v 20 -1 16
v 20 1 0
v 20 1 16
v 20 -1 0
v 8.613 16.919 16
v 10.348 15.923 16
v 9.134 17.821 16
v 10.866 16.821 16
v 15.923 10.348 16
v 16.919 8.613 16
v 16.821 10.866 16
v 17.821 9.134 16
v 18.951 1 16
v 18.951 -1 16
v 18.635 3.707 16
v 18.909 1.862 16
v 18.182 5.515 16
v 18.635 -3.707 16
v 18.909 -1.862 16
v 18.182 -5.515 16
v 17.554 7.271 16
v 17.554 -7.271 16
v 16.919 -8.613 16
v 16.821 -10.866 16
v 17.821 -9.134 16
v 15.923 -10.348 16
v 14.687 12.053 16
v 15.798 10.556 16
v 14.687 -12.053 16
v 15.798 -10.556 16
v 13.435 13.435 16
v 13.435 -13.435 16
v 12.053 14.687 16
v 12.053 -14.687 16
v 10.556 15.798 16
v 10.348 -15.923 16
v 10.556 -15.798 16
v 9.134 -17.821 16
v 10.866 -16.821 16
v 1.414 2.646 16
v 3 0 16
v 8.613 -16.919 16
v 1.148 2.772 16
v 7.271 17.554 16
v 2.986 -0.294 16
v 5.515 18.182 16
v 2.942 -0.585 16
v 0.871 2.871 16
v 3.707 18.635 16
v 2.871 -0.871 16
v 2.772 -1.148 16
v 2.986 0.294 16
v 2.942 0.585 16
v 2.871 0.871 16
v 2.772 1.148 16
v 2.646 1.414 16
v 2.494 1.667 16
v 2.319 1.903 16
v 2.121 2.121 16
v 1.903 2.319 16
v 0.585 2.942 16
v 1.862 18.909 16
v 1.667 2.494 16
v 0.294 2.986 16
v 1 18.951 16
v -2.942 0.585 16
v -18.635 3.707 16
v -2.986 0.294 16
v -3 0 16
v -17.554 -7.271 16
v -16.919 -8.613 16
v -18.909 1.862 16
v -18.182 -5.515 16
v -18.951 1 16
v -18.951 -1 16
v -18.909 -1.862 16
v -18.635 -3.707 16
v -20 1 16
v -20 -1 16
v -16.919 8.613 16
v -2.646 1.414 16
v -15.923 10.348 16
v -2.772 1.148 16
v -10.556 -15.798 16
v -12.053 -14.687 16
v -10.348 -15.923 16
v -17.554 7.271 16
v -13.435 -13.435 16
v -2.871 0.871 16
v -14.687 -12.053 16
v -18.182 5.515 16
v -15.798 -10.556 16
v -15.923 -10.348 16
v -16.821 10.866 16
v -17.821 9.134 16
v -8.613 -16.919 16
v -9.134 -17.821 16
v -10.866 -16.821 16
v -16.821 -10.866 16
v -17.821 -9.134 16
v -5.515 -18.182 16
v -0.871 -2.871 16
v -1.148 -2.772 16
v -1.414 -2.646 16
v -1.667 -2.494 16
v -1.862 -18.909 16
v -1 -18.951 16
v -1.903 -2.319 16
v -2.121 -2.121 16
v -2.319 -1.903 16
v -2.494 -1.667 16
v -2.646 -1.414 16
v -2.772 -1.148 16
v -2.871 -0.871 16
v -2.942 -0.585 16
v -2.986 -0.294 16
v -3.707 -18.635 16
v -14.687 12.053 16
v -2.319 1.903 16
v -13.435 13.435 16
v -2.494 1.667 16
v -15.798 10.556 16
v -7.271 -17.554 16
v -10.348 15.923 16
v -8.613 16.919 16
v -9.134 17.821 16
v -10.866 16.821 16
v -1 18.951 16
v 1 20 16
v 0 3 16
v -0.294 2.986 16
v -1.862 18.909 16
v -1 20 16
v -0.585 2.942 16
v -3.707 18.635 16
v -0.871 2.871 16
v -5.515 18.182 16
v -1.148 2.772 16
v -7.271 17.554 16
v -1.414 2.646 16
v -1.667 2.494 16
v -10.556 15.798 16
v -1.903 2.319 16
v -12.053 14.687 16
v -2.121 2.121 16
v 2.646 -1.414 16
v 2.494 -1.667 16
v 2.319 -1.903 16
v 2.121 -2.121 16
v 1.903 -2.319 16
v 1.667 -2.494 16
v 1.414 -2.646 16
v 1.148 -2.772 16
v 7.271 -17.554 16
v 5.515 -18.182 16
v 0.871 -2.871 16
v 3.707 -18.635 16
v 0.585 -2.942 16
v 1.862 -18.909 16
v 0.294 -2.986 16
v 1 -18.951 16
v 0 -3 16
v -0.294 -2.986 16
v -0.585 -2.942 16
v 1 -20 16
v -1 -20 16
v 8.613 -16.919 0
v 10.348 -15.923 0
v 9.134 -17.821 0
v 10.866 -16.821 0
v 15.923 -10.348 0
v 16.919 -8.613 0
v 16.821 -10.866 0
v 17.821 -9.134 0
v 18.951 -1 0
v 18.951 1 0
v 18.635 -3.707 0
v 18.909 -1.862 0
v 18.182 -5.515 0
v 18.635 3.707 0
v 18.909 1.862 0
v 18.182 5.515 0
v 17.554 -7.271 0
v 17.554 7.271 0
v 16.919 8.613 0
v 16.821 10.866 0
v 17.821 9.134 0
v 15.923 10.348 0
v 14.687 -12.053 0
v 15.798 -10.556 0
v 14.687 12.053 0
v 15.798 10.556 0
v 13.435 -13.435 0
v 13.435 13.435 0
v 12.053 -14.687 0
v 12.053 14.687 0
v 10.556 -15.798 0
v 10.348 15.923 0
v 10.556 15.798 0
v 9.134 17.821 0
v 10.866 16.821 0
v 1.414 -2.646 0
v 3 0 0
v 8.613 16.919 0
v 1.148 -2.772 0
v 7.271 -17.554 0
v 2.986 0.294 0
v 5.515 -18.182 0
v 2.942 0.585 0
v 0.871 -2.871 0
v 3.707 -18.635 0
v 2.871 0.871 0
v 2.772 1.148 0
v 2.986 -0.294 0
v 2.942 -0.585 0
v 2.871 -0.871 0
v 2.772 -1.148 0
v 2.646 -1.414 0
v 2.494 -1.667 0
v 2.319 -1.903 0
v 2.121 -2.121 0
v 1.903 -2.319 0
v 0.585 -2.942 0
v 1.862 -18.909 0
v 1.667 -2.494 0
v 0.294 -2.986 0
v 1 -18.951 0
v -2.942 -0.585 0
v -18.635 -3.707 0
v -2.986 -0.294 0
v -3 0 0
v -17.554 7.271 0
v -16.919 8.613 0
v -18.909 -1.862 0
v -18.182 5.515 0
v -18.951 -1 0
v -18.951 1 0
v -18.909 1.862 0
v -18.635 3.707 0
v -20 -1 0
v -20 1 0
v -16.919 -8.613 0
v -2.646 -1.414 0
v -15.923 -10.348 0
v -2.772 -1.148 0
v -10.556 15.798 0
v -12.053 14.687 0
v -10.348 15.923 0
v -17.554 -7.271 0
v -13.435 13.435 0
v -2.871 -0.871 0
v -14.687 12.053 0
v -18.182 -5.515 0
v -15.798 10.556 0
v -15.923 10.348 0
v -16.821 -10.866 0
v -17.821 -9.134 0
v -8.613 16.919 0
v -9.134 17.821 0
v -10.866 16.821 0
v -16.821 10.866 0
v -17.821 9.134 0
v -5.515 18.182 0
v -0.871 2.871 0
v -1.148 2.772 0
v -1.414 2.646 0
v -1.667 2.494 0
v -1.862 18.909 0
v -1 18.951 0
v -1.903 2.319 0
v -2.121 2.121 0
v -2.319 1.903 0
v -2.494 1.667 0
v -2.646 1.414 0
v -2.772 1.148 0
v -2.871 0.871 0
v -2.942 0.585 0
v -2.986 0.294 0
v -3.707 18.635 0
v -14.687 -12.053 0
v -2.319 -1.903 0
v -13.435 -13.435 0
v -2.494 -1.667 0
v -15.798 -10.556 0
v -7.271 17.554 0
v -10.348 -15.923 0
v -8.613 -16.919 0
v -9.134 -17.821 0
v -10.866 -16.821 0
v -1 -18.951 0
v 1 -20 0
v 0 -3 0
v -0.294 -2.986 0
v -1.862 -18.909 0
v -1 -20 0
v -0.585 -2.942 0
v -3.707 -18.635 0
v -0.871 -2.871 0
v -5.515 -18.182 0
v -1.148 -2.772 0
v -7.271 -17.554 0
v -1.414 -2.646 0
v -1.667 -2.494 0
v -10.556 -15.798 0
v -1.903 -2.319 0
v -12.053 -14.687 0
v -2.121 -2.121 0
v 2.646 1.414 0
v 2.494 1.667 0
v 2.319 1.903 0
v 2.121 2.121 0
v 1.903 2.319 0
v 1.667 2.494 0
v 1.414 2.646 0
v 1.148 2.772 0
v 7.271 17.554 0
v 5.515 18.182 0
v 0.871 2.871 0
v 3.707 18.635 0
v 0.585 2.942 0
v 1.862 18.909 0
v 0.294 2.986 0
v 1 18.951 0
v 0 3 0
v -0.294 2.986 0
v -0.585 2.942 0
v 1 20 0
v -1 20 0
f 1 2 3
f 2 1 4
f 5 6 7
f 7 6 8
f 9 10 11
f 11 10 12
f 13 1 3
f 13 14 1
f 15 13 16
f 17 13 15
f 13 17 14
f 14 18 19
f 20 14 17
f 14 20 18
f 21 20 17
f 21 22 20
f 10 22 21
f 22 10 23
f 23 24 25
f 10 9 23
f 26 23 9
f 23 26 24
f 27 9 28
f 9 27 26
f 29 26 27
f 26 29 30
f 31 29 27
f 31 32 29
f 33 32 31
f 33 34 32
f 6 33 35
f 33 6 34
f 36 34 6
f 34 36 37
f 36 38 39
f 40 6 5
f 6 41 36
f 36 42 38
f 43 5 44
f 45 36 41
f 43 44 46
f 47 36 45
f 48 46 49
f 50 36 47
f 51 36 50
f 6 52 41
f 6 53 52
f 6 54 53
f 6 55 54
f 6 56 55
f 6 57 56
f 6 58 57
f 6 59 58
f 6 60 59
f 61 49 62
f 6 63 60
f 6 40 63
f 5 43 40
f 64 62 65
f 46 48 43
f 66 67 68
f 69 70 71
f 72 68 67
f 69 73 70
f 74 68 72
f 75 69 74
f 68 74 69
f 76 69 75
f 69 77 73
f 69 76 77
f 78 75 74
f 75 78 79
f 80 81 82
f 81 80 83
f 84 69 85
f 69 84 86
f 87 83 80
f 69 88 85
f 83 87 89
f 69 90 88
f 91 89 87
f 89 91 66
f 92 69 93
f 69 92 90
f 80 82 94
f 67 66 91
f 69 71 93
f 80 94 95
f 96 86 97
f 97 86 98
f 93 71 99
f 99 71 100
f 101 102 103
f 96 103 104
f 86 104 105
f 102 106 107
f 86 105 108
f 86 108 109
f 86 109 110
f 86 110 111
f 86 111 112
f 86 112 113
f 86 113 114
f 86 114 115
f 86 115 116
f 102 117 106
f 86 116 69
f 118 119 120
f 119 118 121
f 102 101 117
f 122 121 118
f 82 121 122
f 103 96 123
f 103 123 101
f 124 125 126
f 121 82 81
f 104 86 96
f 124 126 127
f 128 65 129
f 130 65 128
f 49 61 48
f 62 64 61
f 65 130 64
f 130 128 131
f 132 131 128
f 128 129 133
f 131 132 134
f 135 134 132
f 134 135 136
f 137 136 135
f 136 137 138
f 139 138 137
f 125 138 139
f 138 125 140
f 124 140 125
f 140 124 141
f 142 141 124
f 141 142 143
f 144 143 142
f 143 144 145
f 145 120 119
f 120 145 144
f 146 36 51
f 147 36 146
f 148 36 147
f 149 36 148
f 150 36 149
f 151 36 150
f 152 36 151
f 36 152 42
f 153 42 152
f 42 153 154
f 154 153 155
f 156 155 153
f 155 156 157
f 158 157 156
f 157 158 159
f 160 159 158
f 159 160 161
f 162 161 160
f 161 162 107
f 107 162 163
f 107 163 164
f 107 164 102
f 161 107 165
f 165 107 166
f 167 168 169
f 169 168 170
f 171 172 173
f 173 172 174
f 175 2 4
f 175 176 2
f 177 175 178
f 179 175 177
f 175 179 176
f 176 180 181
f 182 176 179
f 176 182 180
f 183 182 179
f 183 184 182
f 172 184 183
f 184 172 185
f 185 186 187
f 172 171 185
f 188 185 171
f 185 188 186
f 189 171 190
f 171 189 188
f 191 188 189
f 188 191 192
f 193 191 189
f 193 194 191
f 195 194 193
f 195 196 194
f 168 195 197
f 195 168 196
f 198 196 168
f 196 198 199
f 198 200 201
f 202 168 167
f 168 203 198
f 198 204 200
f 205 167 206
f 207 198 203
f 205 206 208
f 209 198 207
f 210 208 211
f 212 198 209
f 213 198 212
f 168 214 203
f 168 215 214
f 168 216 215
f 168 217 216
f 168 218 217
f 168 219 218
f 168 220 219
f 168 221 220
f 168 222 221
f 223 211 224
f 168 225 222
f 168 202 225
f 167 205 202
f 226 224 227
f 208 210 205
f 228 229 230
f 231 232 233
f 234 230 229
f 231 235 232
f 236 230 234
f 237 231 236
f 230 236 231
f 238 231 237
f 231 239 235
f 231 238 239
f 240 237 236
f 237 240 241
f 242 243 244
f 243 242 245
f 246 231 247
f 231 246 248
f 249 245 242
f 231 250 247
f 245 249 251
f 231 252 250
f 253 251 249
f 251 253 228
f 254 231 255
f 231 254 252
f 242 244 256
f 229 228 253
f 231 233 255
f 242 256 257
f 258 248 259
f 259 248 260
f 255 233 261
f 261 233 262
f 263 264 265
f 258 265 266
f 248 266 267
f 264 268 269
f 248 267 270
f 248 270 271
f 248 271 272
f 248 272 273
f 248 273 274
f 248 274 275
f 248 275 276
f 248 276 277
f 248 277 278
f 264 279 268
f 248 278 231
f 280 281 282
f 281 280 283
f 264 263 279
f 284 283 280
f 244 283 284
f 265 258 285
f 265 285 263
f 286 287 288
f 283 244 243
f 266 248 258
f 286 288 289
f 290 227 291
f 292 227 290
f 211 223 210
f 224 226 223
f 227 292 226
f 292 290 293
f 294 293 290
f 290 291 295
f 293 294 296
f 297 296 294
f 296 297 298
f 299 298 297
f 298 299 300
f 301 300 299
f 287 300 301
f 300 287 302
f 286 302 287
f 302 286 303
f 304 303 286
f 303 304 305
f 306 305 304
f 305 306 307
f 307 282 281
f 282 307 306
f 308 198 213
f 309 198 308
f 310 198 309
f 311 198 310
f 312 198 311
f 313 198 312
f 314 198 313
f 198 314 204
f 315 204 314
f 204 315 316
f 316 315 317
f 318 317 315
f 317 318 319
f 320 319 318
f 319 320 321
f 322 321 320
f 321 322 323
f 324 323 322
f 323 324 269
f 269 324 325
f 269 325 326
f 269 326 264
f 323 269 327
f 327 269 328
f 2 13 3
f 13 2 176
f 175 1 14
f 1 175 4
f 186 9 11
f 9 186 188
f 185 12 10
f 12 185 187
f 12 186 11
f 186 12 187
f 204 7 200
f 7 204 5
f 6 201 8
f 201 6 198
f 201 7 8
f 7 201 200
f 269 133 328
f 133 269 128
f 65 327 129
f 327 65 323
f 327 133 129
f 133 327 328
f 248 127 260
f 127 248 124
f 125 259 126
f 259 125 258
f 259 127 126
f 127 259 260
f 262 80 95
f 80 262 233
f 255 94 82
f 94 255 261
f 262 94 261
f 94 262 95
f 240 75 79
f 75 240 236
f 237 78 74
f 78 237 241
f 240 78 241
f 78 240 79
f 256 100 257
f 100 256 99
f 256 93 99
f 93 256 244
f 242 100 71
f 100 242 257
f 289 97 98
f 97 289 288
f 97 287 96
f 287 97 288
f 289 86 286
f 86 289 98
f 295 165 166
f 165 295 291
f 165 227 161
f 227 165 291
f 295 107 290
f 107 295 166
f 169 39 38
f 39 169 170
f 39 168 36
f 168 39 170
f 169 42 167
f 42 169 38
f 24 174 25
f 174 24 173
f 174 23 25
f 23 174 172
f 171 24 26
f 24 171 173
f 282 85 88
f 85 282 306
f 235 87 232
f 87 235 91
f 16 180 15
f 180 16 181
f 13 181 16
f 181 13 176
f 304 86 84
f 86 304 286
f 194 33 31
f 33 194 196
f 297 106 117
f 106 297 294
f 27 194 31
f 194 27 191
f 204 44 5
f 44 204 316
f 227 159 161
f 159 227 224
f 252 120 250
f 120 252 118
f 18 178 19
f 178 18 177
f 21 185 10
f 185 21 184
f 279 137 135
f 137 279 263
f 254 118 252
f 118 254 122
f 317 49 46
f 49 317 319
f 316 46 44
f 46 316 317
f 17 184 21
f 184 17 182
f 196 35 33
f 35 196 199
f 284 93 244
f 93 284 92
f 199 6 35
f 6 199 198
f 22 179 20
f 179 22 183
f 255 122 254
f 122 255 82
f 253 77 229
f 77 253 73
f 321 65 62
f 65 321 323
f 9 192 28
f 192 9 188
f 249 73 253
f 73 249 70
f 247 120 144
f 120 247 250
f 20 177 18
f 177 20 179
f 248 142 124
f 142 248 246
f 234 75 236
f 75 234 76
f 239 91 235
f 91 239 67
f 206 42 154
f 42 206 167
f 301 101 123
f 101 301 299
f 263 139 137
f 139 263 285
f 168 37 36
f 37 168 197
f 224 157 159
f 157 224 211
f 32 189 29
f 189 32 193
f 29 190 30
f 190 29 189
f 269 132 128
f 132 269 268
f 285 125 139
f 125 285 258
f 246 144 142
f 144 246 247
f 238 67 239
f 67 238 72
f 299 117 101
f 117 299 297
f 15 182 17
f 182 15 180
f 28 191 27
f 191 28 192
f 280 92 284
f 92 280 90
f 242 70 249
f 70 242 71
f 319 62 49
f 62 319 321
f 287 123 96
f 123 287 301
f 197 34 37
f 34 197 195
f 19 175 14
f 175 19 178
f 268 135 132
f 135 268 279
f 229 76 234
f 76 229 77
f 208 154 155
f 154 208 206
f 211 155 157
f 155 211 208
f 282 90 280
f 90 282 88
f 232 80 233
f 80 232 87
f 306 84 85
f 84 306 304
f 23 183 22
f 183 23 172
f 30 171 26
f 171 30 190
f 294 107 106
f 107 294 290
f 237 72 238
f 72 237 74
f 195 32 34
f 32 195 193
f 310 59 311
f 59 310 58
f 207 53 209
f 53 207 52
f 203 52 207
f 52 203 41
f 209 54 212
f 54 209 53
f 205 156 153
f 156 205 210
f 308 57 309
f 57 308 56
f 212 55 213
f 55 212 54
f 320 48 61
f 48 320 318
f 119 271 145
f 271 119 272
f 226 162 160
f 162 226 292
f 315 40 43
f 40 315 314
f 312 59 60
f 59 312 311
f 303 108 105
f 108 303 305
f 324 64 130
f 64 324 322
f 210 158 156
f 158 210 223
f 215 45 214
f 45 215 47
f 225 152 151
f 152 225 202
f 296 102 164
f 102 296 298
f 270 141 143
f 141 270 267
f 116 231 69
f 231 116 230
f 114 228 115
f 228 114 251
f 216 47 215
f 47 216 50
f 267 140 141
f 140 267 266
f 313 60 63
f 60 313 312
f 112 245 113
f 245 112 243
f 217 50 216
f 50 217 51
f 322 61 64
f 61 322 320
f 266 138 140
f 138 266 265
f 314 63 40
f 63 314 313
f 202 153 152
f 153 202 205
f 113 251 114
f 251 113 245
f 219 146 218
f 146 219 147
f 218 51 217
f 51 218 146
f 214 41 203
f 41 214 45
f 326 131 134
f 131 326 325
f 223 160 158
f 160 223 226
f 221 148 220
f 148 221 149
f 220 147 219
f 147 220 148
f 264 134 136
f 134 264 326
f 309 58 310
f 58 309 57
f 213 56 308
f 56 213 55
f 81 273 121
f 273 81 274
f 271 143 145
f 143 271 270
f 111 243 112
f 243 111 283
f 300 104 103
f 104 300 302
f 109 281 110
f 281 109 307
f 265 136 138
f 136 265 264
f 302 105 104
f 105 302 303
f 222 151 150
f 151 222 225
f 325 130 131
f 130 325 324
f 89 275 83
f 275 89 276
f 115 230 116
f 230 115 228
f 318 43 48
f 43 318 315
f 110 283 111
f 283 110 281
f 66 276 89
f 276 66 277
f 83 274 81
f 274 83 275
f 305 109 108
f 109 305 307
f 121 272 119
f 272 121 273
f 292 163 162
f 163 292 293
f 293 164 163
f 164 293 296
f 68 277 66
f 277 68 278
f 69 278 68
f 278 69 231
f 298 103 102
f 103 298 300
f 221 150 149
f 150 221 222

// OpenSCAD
// Starter ribbed wheel for task-025.
$fn = 64;

ribs = 12;
outside_diameter = 38;
height = 16;
center_hole_diameter = 6;

difference() {
  union() {
    cylinder(h = height, r = outside_diameter / 2);
    for (i = [0 : ribs - 1])
      rotate([0, 0, 360 * i / ribs])
        translate([8, -1, 0])
          cube([12, 2, height]);
  }

  translate([0, 0, -1])
    cylinder(h = height + 2, r = center_hole_diameter / 2);
}
